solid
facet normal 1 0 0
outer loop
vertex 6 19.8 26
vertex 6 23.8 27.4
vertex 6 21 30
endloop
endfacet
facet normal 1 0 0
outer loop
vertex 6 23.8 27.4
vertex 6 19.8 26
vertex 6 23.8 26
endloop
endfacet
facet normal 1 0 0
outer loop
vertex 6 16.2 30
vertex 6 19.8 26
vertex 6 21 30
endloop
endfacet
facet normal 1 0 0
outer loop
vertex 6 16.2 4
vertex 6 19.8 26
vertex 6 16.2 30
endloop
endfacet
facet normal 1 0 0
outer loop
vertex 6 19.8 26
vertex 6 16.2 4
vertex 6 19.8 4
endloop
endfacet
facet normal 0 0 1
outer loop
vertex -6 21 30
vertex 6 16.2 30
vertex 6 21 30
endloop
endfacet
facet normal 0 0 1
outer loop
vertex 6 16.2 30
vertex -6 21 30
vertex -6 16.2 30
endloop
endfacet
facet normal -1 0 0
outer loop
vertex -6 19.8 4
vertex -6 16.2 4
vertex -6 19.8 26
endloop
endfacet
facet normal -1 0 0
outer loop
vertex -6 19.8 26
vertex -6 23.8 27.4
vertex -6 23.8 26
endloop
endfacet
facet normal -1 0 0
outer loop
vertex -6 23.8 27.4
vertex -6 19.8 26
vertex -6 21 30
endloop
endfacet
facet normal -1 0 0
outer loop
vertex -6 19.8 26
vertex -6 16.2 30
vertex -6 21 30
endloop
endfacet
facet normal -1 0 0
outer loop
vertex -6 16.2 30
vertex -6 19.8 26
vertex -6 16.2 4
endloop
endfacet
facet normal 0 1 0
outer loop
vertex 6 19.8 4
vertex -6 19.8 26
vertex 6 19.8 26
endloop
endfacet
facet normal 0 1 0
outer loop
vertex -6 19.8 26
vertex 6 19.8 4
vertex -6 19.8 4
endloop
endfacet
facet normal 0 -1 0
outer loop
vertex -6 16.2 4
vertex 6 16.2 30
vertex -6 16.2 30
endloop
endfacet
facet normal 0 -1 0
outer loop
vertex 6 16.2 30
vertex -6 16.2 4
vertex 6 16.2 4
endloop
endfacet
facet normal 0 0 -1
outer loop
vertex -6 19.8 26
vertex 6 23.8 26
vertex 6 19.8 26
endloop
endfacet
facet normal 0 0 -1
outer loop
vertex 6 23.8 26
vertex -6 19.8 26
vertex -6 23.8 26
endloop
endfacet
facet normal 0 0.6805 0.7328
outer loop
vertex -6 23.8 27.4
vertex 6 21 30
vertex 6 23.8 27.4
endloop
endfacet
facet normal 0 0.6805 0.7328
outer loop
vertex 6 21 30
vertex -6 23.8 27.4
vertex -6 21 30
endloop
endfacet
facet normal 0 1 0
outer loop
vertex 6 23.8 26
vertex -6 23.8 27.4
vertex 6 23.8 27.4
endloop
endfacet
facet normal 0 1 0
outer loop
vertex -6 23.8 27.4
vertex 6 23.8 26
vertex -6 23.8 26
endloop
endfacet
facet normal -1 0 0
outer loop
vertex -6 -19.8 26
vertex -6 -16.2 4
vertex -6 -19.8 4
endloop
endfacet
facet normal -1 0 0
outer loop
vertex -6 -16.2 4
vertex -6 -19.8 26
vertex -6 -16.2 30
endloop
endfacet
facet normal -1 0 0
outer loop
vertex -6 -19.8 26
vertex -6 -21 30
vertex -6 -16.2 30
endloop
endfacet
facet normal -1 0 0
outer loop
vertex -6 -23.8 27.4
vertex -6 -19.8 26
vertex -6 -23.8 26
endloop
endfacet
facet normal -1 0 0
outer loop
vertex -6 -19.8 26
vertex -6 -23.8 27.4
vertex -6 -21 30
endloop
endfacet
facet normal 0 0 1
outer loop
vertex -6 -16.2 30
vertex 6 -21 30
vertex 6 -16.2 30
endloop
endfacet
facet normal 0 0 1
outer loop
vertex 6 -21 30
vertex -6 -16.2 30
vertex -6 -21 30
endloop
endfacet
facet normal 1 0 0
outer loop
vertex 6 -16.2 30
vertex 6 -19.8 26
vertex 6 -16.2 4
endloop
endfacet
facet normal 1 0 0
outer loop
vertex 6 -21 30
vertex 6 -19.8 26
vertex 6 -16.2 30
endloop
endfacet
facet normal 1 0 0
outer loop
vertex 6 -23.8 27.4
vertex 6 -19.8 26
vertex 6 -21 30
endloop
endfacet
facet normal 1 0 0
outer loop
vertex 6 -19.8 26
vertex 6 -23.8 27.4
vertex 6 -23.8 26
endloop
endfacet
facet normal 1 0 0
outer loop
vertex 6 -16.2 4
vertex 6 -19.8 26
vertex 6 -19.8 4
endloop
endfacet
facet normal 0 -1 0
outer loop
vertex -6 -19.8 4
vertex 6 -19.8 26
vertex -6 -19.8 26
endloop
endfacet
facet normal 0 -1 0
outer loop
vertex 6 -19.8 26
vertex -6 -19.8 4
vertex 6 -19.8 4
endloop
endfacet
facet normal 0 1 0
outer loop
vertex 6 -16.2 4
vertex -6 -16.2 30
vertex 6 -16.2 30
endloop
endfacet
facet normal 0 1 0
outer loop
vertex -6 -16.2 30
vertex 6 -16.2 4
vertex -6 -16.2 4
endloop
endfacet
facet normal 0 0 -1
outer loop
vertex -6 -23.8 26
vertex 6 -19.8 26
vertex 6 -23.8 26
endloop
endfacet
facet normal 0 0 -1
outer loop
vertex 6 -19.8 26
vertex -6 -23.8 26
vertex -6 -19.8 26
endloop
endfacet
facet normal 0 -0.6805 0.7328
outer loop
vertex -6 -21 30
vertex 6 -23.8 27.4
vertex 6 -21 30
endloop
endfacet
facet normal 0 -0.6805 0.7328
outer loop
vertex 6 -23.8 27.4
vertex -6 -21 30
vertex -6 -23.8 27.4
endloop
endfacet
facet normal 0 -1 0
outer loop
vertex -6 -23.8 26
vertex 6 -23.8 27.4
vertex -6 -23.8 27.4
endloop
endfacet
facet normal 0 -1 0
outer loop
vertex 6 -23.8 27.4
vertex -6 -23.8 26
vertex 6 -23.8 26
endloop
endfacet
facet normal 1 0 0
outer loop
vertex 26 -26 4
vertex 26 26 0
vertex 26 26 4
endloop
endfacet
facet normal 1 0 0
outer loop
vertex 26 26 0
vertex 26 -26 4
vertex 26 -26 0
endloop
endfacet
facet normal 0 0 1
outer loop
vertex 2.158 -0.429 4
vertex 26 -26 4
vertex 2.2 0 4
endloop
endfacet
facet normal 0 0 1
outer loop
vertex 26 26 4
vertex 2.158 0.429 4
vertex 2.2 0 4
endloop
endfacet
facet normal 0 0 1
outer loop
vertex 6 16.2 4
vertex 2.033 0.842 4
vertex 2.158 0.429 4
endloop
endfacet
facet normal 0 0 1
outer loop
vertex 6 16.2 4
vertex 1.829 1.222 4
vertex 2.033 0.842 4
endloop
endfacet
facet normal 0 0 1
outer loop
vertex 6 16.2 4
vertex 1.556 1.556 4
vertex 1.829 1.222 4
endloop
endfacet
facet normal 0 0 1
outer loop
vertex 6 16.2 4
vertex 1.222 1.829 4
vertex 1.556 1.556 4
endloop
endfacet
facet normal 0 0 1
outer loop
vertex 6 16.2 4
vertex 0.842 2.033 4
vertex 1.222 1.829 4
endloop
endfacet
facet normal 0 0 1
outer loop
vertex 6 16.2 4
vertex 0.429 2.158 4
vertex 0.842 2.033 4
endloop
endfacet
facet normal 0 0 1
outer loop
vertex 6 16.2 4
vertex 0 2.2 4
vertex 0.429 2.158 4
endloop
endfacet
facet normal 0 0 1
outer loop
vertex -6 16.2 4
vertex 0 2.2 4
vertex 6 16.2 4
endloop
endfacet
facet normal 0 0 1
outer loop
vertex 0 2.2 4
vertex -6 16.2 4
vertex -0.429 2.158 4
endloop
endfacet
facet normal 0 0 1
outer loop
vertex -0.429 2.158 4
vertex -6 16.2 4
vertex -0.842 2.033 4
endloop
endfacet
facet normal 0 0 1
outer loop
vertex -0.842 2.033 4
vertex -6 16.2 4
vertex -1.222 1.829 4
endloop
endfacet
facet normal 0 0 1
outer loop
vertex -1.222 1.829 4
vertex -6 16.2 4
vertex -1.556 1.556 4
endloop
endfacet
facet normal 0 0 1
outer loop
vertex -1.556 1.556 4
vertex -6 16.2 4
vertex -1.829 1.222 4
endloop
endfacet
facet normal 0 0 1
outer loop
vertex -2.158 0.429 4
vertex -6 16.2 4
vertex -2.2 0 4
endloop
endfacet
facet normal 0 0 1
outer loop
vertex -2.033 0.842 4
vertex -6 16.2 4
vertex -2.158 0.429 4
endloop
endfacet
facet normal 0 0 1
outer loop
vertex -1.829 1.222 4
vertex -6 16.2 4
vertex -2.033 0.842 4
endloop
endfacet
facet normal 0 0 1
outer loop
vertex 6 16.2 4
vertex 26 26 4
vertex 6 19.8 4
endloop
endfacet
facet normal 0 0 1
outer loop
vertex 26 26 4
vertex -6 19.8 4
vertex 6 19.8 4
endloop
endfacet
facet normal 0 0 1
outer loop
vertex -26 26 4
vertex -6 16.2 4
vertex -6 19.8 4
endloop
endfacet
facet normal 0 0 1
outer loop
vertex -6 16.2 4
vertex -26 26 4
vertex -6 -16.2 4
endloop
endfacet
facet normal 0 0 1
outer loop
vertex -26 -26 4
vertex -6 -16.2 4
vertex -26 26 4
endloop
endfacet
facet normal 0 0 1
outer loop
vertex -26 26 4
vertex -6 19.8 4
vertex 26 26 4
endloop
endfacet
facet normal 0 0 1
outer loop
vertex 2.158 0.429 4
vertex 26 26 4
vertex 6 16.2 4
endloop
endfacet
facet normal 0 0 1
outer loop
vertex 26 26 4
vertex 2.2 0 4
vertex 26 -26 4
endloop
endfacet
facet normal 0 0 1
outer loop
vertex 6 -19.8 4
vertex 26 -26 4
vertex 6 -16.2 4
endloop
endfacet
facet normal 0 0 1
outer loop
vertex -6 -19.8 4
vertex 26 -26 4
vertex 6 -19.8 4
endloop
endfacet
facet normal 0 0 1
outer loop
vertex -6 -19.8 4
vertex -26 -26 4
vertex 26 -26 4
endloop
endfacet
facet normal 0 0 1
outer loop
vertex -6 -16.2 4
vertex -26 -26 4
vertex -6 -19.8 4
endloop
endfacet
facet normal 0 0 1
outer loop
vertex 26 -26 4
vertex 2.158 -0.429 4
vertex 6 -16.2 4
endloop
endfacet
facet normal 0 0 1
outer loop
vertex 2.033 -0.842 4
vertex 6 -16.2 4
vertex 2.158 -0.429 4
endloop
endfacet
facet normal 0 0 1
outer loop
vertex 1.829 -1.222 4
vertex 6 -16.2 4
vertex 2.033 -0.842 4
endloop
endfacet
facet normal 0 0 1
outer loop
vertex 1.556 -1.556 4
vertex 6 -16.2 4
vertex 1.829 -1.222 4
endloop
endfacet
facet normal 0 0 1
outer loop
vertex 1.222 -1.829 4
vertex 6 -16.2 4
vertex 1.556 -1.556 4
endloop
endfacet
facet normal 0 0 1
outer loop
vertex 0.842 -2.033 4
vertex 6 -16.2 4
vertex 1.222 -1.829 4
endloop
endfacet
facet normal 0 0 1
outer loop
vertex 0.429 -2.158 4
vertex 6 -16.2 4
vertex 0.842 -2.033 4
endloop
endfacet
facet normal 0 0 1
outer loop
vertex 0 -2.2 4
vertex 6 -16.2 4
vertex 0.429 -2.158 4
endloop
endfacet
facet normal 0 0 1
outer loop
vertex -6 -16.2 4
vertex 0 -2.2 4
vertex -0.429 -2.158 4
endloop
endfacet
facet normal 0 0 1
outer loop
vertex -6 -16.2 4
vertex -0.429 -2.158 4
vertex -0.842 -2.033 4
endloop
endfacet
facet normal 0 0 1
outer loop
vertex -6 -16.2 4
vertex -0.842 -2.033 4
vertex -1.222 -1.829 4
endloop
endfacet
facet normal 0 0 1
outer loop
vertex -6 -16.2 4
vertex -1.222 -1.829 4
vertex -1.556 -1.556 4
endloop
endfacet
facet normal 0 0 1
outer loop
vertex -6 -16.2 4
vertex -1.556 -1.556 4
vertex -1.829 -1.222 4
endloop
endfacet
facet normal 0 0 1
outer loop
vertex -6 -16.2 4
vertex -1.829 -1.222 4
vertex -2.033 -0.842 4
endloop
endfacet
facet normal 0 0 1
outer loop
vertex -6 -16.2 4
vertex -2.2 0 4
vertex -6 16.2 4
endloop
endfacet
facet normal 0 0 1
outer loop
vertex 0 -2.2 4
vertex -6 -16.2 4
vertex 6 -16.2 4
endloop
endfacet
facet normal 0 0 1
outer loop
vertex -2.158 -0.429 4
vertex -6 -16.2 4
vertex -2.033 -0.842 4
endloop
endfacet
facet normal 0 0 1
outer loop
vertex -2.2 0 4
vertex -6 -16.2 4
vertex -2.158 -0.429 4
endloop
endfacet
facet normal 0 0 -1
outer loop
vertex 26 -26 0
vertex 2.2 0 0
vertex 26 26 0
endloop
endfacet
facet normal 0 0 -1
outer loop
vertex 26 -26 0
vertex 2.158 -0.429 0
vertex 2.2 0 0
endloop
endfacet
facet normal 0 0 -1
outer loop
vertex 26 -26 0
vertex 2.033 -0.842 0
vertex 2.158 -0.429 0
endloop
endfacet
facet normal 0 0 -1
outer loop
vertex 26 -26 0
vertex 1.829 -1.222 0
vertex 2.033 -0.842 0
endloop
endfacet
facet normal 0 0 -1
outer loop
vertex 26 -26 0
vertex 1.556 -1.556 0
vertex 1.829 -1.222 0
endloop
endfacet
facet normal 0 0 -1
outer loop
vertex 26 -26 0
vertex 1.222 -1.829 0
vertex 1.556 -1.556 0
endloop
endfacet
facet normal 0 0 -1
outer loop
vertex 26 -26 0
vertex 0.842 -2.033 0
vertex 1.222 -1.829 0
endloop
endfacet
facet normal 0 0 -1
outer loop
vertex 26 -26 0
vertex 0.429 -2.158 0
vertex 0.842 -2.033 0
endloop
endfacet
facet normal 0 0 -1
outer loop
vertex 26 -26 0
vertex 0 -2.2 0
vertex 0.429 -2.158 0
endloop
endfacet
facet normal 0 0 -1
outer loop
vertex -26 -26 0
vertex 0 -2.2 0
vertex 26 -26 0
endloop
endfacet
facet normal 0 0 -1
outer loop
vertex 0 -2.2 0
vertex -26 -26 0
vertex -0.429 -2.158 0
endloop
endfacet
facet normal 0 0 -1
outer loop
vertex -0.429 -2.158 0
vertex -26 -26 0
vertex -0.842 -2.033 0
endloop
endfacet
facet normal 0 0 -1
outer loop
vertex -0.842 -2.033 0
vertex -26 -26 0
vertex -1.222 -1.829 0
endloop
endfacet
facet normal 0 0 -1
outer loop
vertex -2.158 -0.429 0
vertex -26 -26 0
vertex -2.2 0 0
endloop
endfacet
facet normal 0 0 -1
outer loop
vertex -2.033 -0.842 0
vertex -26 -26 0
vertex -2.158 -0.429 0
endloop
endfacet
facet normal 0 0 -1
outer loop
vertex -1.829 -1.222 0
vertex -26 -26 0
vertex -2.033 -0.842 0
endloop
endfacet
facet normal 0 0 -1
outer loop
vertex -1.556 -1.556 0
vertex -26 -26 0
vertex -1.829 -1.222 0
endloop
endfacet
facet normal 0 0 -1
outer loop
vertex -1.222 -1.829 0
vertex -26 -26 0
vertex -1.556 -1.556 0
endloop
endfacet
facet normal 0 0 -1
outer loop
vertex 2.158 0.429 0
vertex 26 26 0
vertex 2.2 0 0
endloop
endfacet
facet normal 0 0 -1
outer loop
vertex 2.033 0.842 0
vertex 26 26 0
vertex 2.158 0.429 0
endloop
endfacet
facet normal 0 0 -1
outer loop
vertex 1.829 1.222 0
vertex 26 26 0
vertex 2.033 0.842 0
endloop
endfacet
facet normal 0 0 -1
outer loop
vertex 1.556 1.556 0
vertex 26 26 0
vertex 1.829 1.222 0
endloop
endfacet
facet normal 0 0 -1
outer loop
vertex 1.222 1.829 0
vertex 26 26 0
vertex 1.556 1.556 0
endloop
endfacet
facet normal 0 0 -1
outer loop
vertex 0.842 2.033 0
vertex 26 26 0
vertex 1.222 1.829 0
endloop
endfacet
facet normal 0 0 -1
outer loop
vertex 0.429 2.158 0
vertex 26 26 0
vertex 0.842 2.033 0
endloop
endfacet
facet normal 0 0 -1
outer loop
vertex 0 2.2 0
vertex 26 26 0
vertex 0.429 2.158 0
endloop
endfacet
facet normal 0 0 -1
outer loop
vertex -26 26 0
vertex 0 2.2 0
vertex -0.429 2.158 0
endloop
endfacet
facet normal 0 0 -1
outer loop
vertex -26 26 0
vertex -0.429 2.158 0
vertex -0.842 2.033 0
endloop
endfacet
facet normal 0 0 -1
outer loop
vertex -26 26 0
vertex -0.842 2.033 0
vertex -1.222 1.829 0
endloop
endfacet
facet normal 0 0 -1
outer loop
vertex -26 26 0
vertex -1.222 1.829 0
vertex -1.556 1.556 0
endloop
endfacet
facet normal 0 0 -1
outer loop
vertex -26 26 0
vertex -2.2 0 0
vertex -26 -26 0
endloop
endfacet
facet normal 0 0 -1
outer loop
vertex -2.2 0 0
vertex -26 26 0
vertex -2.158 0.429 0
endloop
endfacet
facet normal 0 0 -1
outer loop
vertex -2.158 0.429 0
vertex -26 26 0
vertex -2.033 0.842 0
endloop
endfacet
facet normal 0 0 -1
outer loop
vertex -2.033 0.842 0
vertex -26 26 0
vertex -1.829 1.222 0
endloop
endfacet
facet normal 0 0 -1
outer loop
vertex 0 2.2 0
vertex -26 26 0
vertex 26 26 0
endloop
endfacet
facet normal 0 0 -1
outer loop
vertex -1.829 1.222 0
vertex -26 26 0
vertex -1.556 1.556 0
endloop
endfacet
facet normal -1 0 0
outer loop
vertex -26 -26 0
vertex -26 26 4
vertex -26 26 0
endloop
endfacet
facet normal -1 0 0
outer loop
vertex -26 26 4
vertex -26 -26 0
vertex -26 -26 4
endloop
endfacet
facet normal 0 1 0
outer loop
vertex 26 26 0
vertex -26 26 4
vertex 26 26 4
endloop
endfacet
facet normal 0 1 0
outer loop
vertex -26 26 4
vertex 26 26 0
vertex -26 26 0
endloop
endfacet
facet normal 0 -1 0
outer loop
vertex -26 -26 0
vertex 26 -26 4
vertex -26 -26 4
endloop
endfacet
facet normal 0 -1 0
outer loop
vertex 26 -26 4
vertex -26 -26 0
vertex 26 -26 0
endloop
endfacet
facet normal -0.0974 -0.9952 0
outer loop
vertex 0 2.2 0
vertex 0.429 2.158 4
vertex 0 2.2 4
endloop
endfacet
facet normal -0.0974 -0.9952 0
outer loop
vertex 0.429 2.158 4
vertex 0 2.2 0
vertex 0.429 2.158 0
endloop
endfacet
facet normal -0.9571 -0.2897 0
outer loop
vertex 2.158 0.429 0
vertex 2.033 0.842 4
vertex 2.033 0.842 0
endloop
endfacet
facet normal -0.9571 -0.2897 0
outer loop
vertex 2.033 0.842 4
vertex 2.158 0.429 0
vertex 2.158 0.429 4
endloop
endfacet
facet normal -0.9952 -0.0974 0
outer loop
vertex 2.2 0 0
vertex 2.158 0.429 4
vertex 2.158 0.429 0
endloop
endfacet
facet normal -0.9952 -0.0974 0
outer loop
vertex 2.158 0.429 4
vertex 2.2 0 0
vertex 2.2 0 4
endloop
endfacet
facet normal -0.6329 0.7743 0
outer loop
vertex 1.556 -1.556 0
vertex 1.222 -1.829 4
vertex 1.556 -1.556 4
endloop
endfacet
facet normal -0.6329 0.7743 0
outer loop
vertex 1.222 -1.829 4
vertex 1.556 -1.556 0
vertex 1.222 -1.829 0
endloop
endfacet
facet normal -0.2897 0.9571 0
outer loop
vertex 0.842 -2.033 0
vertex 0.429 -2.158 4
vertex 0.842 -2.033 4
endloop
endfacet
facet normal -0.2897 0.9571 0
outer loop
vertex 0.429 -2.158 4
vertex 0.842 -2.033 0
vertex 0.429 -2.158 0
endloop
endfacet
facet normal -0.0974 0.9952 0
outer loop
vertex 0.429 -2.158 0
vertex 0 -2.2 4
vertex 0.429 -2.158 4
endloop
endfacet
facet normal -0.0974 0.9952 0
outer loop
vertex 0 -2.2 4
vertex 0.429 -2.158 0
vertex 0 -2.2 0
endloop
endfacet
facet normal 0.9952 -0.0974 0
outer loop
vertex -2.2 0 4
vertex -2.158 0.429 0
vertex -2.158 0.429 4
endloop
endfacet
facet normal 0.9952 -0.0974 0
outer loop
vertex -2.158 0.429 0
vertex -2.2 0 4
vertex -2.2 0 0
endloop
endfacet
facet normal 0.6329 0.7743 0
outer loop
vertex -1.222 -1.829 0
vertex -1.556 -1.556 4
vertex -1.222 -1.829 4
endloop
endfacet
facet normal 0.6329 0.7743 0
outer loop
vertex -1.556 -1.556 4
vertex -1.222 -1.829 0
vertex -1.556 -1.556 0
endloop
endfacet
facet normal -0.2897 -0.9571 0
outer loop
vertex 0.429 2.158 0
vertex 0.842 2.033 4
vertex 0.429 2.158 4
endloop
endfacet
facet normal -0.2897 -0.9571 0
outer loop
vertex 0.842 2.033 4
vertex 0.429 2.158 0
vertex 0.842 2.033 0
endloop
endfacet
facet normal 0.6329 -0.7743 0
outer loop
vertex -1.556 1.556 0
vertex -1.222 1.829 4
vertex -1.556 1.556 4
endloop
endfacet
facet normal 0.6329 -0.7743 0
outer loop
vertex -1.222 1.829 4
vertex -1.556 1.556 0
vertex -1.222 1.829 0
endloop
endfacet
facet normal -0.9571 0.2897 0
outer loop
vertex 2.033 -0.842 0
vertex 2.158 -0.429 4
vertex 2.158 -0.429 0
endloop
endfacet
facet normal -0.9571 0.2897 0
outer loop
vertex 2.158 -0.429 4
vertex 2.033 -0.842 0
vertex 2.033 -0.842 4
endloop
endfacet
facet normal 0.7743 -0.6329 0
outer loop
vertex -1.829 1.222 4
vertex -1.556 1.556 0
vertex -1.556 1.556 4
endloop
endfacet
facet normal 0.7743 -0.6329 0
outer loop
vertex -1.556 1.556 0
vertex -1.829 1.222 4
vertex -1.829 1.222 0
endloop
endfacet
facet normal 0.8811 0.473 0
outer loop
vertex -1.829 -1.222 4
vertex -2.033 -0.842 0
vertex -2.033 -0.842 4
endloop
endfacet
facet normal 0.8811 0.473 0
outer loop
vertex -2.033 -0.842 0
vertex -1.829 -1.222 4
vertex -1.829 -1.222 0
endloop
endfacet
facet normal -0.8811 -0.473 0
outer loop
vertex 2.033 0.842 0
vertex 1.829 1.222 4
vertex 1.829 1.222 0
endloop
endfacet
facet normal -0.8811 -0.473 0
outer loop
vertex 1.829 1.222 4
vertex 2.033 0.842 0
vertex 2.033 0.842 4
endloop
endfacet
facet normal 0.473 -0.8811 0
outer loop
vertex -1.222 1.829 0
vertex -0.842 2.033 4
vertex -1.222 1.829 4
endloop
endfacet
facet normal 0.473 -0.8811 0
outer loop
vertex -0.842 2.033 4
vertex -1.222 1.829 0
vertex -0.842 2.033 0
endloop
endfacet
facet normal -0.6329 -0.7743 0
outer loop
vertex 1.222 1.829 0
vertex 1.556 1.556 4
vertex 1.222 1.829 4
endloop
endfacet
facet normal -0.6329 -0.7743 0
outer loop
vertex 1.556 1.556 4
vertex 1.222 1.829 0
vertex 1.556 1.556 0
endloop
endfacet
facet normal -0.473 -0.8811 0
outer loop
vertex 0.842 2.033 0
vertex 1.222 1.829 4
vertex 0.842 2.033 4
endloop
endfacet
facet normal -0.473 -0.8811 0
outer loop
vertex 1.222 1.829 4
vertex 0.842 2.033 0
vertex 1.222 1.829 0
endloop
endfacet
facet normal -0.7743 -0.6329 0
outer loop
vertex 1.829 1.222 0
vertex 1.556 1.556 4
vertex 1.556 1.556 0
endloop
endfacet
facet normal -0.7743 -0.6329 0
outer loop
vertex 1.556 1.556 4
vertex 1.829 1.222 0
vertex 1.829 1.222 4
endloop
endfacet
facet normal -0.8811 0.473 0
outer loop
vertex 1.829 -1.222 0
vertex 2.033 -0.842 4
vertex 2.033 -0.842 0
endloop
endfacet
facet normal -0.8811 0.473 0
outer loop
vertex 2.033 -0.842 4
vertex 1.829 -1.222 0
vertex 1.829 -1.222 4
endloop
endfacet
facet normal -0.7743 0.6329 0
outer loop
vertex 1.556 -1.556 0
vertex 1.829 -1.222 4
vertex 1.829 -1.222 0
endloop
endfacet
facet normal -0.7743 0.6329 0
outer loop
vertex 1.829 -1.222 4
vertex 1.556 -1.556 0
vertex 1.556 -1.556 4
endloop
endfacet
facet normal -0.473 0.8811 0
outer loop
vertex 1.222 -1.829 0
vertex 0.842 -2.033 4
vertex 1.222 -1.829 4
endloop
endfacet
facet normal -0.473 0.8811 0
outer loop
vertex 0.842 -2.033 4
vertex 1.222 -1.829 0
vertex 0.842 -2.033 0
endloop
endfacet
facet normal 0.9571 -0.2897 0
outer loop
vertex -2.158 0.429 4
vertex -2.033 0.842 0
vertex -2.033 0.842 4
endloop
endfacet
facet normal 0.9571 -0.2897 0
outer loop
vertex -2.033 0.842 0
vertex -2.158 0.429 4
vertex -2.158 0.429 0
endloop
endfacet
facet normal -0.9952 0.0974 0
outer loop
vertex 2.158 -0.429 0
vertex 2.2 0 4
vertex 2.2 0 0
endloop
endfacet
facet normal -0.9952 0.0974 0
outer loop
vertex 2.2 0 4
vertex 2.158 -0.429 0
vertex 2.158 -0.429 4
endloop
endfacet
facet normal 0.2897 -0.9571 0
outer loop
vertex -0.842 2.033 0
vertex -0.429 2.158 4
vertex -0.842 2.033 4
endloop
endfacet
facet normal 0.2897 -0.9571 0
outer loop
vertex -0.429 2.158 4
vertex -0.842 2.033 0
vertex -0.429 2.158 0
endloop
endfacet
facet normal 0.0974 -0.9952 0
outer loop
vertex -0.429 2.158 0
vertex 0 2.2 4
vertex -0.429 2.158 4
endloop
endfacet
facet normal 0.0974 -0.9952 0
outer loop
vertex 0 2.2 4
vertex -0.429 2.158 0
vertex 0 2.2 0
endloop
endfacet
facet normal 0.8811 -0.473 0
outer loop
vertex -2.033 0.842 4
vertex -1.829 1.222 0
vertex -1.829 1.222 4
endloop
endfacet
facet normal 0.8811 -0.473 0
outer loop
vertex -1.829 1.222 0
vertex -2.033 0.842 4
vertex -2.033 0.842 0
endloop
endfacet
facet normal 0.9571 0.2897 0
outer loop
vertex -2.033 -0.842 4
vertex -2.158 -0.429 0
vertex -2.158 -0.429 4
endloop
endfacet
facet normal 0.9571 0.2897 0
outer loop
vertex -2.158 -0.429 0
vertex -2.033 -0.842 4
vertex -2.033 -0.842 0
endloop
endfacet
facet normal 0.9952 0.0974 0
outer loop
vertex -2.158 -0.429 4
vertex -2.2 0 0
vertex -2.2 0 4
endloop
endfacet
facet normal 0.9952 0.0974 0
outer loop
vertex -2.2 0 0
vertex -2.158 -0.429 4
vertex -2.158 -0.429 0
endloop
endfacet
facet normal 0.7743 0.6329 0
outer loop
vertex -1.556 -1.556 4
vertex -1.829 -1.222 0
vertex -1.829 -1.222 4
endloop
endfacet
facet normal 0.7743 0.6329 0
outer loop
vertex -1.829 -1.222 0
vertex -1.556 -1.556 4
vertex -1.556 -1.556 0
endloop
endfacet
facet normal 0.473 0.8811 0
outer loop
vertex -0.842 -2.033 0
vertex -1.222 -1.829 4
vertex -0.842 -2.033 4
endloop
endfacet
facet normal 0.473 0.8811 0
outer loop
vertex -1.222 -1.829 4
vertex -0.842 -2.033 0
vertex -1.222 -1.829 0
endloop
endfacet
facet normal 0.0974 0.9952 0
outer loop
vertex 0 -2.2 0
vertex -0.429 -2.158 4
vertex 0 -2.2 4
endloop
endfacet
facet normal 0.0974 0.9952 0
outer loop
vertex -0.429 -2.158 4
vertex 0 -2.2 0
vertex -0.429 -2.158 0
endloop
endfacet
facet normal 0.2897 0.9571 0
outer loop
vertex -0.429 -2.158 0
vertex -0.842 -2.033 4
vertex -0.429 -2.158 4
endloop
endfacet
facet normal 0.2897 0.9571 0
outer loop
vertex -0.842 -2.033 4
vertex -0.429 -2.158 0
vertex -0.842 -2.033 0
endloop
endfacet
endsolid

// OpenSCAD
$fn = 32;

// ----------------------------------------------------------------------
// Snap-fit latch: 2 arms, 26 mm tall, 4.2 mm undercut hooks
// ----------------------------------------------------------------------

// --- parameters (mm) ---
base_d = 52;              // base plate depth
base_h = 4;               // base plate thickness
span = 36;                // distance between opposite arms
arm_t = 3.6;              // arm thickness
arm_d = 12;               // arm width
height = 26;              // free arm length
head_len = 4.2;           // hook reach
head_h = 4;               // hook height
lead = 1.4;               // lead-in ramp thickness
bore_d = 4.4;             // base fixing bore
top_z = 30;               // height of the arm tips above the base

arms = 2;

difference() {
  union() {
    /* base plate, centred on the arm ring */
    translate([-26, -26, 0]) cube([base_d, base_d, base_h]);
    for (a = [0 : 360 / arms : 359]) rotate([0, 0, a]) {
    /* arm, sunk 0.5 mm into the base */
    translate([-arm_d / 2, span / 2 - arm_t / 2, base_h - 0.5]) cube([arm_d, arm_t, height + 0.5]);
    /* hook: a convex hull of a tall inner block and a thin outer lip
       gives a flat undercut below and a lead-in ramp on top */
    hull() {
      translate([-arm_d / 2, span / 2 + arm_t / 2 - 0.6, top_z - head_h]) cube([arm_d, lead + 0.4, head_h]);
      translate([-arm_d / 2, span / 2 + arm_t / 2 - 0.2, top_z - head_h]) cube([arm_d, head_len, lead]);
    }
    }
  }
  translate([0, 0, -2.5]) cylinder(h = base_h + 5, d = bore_d);
}
